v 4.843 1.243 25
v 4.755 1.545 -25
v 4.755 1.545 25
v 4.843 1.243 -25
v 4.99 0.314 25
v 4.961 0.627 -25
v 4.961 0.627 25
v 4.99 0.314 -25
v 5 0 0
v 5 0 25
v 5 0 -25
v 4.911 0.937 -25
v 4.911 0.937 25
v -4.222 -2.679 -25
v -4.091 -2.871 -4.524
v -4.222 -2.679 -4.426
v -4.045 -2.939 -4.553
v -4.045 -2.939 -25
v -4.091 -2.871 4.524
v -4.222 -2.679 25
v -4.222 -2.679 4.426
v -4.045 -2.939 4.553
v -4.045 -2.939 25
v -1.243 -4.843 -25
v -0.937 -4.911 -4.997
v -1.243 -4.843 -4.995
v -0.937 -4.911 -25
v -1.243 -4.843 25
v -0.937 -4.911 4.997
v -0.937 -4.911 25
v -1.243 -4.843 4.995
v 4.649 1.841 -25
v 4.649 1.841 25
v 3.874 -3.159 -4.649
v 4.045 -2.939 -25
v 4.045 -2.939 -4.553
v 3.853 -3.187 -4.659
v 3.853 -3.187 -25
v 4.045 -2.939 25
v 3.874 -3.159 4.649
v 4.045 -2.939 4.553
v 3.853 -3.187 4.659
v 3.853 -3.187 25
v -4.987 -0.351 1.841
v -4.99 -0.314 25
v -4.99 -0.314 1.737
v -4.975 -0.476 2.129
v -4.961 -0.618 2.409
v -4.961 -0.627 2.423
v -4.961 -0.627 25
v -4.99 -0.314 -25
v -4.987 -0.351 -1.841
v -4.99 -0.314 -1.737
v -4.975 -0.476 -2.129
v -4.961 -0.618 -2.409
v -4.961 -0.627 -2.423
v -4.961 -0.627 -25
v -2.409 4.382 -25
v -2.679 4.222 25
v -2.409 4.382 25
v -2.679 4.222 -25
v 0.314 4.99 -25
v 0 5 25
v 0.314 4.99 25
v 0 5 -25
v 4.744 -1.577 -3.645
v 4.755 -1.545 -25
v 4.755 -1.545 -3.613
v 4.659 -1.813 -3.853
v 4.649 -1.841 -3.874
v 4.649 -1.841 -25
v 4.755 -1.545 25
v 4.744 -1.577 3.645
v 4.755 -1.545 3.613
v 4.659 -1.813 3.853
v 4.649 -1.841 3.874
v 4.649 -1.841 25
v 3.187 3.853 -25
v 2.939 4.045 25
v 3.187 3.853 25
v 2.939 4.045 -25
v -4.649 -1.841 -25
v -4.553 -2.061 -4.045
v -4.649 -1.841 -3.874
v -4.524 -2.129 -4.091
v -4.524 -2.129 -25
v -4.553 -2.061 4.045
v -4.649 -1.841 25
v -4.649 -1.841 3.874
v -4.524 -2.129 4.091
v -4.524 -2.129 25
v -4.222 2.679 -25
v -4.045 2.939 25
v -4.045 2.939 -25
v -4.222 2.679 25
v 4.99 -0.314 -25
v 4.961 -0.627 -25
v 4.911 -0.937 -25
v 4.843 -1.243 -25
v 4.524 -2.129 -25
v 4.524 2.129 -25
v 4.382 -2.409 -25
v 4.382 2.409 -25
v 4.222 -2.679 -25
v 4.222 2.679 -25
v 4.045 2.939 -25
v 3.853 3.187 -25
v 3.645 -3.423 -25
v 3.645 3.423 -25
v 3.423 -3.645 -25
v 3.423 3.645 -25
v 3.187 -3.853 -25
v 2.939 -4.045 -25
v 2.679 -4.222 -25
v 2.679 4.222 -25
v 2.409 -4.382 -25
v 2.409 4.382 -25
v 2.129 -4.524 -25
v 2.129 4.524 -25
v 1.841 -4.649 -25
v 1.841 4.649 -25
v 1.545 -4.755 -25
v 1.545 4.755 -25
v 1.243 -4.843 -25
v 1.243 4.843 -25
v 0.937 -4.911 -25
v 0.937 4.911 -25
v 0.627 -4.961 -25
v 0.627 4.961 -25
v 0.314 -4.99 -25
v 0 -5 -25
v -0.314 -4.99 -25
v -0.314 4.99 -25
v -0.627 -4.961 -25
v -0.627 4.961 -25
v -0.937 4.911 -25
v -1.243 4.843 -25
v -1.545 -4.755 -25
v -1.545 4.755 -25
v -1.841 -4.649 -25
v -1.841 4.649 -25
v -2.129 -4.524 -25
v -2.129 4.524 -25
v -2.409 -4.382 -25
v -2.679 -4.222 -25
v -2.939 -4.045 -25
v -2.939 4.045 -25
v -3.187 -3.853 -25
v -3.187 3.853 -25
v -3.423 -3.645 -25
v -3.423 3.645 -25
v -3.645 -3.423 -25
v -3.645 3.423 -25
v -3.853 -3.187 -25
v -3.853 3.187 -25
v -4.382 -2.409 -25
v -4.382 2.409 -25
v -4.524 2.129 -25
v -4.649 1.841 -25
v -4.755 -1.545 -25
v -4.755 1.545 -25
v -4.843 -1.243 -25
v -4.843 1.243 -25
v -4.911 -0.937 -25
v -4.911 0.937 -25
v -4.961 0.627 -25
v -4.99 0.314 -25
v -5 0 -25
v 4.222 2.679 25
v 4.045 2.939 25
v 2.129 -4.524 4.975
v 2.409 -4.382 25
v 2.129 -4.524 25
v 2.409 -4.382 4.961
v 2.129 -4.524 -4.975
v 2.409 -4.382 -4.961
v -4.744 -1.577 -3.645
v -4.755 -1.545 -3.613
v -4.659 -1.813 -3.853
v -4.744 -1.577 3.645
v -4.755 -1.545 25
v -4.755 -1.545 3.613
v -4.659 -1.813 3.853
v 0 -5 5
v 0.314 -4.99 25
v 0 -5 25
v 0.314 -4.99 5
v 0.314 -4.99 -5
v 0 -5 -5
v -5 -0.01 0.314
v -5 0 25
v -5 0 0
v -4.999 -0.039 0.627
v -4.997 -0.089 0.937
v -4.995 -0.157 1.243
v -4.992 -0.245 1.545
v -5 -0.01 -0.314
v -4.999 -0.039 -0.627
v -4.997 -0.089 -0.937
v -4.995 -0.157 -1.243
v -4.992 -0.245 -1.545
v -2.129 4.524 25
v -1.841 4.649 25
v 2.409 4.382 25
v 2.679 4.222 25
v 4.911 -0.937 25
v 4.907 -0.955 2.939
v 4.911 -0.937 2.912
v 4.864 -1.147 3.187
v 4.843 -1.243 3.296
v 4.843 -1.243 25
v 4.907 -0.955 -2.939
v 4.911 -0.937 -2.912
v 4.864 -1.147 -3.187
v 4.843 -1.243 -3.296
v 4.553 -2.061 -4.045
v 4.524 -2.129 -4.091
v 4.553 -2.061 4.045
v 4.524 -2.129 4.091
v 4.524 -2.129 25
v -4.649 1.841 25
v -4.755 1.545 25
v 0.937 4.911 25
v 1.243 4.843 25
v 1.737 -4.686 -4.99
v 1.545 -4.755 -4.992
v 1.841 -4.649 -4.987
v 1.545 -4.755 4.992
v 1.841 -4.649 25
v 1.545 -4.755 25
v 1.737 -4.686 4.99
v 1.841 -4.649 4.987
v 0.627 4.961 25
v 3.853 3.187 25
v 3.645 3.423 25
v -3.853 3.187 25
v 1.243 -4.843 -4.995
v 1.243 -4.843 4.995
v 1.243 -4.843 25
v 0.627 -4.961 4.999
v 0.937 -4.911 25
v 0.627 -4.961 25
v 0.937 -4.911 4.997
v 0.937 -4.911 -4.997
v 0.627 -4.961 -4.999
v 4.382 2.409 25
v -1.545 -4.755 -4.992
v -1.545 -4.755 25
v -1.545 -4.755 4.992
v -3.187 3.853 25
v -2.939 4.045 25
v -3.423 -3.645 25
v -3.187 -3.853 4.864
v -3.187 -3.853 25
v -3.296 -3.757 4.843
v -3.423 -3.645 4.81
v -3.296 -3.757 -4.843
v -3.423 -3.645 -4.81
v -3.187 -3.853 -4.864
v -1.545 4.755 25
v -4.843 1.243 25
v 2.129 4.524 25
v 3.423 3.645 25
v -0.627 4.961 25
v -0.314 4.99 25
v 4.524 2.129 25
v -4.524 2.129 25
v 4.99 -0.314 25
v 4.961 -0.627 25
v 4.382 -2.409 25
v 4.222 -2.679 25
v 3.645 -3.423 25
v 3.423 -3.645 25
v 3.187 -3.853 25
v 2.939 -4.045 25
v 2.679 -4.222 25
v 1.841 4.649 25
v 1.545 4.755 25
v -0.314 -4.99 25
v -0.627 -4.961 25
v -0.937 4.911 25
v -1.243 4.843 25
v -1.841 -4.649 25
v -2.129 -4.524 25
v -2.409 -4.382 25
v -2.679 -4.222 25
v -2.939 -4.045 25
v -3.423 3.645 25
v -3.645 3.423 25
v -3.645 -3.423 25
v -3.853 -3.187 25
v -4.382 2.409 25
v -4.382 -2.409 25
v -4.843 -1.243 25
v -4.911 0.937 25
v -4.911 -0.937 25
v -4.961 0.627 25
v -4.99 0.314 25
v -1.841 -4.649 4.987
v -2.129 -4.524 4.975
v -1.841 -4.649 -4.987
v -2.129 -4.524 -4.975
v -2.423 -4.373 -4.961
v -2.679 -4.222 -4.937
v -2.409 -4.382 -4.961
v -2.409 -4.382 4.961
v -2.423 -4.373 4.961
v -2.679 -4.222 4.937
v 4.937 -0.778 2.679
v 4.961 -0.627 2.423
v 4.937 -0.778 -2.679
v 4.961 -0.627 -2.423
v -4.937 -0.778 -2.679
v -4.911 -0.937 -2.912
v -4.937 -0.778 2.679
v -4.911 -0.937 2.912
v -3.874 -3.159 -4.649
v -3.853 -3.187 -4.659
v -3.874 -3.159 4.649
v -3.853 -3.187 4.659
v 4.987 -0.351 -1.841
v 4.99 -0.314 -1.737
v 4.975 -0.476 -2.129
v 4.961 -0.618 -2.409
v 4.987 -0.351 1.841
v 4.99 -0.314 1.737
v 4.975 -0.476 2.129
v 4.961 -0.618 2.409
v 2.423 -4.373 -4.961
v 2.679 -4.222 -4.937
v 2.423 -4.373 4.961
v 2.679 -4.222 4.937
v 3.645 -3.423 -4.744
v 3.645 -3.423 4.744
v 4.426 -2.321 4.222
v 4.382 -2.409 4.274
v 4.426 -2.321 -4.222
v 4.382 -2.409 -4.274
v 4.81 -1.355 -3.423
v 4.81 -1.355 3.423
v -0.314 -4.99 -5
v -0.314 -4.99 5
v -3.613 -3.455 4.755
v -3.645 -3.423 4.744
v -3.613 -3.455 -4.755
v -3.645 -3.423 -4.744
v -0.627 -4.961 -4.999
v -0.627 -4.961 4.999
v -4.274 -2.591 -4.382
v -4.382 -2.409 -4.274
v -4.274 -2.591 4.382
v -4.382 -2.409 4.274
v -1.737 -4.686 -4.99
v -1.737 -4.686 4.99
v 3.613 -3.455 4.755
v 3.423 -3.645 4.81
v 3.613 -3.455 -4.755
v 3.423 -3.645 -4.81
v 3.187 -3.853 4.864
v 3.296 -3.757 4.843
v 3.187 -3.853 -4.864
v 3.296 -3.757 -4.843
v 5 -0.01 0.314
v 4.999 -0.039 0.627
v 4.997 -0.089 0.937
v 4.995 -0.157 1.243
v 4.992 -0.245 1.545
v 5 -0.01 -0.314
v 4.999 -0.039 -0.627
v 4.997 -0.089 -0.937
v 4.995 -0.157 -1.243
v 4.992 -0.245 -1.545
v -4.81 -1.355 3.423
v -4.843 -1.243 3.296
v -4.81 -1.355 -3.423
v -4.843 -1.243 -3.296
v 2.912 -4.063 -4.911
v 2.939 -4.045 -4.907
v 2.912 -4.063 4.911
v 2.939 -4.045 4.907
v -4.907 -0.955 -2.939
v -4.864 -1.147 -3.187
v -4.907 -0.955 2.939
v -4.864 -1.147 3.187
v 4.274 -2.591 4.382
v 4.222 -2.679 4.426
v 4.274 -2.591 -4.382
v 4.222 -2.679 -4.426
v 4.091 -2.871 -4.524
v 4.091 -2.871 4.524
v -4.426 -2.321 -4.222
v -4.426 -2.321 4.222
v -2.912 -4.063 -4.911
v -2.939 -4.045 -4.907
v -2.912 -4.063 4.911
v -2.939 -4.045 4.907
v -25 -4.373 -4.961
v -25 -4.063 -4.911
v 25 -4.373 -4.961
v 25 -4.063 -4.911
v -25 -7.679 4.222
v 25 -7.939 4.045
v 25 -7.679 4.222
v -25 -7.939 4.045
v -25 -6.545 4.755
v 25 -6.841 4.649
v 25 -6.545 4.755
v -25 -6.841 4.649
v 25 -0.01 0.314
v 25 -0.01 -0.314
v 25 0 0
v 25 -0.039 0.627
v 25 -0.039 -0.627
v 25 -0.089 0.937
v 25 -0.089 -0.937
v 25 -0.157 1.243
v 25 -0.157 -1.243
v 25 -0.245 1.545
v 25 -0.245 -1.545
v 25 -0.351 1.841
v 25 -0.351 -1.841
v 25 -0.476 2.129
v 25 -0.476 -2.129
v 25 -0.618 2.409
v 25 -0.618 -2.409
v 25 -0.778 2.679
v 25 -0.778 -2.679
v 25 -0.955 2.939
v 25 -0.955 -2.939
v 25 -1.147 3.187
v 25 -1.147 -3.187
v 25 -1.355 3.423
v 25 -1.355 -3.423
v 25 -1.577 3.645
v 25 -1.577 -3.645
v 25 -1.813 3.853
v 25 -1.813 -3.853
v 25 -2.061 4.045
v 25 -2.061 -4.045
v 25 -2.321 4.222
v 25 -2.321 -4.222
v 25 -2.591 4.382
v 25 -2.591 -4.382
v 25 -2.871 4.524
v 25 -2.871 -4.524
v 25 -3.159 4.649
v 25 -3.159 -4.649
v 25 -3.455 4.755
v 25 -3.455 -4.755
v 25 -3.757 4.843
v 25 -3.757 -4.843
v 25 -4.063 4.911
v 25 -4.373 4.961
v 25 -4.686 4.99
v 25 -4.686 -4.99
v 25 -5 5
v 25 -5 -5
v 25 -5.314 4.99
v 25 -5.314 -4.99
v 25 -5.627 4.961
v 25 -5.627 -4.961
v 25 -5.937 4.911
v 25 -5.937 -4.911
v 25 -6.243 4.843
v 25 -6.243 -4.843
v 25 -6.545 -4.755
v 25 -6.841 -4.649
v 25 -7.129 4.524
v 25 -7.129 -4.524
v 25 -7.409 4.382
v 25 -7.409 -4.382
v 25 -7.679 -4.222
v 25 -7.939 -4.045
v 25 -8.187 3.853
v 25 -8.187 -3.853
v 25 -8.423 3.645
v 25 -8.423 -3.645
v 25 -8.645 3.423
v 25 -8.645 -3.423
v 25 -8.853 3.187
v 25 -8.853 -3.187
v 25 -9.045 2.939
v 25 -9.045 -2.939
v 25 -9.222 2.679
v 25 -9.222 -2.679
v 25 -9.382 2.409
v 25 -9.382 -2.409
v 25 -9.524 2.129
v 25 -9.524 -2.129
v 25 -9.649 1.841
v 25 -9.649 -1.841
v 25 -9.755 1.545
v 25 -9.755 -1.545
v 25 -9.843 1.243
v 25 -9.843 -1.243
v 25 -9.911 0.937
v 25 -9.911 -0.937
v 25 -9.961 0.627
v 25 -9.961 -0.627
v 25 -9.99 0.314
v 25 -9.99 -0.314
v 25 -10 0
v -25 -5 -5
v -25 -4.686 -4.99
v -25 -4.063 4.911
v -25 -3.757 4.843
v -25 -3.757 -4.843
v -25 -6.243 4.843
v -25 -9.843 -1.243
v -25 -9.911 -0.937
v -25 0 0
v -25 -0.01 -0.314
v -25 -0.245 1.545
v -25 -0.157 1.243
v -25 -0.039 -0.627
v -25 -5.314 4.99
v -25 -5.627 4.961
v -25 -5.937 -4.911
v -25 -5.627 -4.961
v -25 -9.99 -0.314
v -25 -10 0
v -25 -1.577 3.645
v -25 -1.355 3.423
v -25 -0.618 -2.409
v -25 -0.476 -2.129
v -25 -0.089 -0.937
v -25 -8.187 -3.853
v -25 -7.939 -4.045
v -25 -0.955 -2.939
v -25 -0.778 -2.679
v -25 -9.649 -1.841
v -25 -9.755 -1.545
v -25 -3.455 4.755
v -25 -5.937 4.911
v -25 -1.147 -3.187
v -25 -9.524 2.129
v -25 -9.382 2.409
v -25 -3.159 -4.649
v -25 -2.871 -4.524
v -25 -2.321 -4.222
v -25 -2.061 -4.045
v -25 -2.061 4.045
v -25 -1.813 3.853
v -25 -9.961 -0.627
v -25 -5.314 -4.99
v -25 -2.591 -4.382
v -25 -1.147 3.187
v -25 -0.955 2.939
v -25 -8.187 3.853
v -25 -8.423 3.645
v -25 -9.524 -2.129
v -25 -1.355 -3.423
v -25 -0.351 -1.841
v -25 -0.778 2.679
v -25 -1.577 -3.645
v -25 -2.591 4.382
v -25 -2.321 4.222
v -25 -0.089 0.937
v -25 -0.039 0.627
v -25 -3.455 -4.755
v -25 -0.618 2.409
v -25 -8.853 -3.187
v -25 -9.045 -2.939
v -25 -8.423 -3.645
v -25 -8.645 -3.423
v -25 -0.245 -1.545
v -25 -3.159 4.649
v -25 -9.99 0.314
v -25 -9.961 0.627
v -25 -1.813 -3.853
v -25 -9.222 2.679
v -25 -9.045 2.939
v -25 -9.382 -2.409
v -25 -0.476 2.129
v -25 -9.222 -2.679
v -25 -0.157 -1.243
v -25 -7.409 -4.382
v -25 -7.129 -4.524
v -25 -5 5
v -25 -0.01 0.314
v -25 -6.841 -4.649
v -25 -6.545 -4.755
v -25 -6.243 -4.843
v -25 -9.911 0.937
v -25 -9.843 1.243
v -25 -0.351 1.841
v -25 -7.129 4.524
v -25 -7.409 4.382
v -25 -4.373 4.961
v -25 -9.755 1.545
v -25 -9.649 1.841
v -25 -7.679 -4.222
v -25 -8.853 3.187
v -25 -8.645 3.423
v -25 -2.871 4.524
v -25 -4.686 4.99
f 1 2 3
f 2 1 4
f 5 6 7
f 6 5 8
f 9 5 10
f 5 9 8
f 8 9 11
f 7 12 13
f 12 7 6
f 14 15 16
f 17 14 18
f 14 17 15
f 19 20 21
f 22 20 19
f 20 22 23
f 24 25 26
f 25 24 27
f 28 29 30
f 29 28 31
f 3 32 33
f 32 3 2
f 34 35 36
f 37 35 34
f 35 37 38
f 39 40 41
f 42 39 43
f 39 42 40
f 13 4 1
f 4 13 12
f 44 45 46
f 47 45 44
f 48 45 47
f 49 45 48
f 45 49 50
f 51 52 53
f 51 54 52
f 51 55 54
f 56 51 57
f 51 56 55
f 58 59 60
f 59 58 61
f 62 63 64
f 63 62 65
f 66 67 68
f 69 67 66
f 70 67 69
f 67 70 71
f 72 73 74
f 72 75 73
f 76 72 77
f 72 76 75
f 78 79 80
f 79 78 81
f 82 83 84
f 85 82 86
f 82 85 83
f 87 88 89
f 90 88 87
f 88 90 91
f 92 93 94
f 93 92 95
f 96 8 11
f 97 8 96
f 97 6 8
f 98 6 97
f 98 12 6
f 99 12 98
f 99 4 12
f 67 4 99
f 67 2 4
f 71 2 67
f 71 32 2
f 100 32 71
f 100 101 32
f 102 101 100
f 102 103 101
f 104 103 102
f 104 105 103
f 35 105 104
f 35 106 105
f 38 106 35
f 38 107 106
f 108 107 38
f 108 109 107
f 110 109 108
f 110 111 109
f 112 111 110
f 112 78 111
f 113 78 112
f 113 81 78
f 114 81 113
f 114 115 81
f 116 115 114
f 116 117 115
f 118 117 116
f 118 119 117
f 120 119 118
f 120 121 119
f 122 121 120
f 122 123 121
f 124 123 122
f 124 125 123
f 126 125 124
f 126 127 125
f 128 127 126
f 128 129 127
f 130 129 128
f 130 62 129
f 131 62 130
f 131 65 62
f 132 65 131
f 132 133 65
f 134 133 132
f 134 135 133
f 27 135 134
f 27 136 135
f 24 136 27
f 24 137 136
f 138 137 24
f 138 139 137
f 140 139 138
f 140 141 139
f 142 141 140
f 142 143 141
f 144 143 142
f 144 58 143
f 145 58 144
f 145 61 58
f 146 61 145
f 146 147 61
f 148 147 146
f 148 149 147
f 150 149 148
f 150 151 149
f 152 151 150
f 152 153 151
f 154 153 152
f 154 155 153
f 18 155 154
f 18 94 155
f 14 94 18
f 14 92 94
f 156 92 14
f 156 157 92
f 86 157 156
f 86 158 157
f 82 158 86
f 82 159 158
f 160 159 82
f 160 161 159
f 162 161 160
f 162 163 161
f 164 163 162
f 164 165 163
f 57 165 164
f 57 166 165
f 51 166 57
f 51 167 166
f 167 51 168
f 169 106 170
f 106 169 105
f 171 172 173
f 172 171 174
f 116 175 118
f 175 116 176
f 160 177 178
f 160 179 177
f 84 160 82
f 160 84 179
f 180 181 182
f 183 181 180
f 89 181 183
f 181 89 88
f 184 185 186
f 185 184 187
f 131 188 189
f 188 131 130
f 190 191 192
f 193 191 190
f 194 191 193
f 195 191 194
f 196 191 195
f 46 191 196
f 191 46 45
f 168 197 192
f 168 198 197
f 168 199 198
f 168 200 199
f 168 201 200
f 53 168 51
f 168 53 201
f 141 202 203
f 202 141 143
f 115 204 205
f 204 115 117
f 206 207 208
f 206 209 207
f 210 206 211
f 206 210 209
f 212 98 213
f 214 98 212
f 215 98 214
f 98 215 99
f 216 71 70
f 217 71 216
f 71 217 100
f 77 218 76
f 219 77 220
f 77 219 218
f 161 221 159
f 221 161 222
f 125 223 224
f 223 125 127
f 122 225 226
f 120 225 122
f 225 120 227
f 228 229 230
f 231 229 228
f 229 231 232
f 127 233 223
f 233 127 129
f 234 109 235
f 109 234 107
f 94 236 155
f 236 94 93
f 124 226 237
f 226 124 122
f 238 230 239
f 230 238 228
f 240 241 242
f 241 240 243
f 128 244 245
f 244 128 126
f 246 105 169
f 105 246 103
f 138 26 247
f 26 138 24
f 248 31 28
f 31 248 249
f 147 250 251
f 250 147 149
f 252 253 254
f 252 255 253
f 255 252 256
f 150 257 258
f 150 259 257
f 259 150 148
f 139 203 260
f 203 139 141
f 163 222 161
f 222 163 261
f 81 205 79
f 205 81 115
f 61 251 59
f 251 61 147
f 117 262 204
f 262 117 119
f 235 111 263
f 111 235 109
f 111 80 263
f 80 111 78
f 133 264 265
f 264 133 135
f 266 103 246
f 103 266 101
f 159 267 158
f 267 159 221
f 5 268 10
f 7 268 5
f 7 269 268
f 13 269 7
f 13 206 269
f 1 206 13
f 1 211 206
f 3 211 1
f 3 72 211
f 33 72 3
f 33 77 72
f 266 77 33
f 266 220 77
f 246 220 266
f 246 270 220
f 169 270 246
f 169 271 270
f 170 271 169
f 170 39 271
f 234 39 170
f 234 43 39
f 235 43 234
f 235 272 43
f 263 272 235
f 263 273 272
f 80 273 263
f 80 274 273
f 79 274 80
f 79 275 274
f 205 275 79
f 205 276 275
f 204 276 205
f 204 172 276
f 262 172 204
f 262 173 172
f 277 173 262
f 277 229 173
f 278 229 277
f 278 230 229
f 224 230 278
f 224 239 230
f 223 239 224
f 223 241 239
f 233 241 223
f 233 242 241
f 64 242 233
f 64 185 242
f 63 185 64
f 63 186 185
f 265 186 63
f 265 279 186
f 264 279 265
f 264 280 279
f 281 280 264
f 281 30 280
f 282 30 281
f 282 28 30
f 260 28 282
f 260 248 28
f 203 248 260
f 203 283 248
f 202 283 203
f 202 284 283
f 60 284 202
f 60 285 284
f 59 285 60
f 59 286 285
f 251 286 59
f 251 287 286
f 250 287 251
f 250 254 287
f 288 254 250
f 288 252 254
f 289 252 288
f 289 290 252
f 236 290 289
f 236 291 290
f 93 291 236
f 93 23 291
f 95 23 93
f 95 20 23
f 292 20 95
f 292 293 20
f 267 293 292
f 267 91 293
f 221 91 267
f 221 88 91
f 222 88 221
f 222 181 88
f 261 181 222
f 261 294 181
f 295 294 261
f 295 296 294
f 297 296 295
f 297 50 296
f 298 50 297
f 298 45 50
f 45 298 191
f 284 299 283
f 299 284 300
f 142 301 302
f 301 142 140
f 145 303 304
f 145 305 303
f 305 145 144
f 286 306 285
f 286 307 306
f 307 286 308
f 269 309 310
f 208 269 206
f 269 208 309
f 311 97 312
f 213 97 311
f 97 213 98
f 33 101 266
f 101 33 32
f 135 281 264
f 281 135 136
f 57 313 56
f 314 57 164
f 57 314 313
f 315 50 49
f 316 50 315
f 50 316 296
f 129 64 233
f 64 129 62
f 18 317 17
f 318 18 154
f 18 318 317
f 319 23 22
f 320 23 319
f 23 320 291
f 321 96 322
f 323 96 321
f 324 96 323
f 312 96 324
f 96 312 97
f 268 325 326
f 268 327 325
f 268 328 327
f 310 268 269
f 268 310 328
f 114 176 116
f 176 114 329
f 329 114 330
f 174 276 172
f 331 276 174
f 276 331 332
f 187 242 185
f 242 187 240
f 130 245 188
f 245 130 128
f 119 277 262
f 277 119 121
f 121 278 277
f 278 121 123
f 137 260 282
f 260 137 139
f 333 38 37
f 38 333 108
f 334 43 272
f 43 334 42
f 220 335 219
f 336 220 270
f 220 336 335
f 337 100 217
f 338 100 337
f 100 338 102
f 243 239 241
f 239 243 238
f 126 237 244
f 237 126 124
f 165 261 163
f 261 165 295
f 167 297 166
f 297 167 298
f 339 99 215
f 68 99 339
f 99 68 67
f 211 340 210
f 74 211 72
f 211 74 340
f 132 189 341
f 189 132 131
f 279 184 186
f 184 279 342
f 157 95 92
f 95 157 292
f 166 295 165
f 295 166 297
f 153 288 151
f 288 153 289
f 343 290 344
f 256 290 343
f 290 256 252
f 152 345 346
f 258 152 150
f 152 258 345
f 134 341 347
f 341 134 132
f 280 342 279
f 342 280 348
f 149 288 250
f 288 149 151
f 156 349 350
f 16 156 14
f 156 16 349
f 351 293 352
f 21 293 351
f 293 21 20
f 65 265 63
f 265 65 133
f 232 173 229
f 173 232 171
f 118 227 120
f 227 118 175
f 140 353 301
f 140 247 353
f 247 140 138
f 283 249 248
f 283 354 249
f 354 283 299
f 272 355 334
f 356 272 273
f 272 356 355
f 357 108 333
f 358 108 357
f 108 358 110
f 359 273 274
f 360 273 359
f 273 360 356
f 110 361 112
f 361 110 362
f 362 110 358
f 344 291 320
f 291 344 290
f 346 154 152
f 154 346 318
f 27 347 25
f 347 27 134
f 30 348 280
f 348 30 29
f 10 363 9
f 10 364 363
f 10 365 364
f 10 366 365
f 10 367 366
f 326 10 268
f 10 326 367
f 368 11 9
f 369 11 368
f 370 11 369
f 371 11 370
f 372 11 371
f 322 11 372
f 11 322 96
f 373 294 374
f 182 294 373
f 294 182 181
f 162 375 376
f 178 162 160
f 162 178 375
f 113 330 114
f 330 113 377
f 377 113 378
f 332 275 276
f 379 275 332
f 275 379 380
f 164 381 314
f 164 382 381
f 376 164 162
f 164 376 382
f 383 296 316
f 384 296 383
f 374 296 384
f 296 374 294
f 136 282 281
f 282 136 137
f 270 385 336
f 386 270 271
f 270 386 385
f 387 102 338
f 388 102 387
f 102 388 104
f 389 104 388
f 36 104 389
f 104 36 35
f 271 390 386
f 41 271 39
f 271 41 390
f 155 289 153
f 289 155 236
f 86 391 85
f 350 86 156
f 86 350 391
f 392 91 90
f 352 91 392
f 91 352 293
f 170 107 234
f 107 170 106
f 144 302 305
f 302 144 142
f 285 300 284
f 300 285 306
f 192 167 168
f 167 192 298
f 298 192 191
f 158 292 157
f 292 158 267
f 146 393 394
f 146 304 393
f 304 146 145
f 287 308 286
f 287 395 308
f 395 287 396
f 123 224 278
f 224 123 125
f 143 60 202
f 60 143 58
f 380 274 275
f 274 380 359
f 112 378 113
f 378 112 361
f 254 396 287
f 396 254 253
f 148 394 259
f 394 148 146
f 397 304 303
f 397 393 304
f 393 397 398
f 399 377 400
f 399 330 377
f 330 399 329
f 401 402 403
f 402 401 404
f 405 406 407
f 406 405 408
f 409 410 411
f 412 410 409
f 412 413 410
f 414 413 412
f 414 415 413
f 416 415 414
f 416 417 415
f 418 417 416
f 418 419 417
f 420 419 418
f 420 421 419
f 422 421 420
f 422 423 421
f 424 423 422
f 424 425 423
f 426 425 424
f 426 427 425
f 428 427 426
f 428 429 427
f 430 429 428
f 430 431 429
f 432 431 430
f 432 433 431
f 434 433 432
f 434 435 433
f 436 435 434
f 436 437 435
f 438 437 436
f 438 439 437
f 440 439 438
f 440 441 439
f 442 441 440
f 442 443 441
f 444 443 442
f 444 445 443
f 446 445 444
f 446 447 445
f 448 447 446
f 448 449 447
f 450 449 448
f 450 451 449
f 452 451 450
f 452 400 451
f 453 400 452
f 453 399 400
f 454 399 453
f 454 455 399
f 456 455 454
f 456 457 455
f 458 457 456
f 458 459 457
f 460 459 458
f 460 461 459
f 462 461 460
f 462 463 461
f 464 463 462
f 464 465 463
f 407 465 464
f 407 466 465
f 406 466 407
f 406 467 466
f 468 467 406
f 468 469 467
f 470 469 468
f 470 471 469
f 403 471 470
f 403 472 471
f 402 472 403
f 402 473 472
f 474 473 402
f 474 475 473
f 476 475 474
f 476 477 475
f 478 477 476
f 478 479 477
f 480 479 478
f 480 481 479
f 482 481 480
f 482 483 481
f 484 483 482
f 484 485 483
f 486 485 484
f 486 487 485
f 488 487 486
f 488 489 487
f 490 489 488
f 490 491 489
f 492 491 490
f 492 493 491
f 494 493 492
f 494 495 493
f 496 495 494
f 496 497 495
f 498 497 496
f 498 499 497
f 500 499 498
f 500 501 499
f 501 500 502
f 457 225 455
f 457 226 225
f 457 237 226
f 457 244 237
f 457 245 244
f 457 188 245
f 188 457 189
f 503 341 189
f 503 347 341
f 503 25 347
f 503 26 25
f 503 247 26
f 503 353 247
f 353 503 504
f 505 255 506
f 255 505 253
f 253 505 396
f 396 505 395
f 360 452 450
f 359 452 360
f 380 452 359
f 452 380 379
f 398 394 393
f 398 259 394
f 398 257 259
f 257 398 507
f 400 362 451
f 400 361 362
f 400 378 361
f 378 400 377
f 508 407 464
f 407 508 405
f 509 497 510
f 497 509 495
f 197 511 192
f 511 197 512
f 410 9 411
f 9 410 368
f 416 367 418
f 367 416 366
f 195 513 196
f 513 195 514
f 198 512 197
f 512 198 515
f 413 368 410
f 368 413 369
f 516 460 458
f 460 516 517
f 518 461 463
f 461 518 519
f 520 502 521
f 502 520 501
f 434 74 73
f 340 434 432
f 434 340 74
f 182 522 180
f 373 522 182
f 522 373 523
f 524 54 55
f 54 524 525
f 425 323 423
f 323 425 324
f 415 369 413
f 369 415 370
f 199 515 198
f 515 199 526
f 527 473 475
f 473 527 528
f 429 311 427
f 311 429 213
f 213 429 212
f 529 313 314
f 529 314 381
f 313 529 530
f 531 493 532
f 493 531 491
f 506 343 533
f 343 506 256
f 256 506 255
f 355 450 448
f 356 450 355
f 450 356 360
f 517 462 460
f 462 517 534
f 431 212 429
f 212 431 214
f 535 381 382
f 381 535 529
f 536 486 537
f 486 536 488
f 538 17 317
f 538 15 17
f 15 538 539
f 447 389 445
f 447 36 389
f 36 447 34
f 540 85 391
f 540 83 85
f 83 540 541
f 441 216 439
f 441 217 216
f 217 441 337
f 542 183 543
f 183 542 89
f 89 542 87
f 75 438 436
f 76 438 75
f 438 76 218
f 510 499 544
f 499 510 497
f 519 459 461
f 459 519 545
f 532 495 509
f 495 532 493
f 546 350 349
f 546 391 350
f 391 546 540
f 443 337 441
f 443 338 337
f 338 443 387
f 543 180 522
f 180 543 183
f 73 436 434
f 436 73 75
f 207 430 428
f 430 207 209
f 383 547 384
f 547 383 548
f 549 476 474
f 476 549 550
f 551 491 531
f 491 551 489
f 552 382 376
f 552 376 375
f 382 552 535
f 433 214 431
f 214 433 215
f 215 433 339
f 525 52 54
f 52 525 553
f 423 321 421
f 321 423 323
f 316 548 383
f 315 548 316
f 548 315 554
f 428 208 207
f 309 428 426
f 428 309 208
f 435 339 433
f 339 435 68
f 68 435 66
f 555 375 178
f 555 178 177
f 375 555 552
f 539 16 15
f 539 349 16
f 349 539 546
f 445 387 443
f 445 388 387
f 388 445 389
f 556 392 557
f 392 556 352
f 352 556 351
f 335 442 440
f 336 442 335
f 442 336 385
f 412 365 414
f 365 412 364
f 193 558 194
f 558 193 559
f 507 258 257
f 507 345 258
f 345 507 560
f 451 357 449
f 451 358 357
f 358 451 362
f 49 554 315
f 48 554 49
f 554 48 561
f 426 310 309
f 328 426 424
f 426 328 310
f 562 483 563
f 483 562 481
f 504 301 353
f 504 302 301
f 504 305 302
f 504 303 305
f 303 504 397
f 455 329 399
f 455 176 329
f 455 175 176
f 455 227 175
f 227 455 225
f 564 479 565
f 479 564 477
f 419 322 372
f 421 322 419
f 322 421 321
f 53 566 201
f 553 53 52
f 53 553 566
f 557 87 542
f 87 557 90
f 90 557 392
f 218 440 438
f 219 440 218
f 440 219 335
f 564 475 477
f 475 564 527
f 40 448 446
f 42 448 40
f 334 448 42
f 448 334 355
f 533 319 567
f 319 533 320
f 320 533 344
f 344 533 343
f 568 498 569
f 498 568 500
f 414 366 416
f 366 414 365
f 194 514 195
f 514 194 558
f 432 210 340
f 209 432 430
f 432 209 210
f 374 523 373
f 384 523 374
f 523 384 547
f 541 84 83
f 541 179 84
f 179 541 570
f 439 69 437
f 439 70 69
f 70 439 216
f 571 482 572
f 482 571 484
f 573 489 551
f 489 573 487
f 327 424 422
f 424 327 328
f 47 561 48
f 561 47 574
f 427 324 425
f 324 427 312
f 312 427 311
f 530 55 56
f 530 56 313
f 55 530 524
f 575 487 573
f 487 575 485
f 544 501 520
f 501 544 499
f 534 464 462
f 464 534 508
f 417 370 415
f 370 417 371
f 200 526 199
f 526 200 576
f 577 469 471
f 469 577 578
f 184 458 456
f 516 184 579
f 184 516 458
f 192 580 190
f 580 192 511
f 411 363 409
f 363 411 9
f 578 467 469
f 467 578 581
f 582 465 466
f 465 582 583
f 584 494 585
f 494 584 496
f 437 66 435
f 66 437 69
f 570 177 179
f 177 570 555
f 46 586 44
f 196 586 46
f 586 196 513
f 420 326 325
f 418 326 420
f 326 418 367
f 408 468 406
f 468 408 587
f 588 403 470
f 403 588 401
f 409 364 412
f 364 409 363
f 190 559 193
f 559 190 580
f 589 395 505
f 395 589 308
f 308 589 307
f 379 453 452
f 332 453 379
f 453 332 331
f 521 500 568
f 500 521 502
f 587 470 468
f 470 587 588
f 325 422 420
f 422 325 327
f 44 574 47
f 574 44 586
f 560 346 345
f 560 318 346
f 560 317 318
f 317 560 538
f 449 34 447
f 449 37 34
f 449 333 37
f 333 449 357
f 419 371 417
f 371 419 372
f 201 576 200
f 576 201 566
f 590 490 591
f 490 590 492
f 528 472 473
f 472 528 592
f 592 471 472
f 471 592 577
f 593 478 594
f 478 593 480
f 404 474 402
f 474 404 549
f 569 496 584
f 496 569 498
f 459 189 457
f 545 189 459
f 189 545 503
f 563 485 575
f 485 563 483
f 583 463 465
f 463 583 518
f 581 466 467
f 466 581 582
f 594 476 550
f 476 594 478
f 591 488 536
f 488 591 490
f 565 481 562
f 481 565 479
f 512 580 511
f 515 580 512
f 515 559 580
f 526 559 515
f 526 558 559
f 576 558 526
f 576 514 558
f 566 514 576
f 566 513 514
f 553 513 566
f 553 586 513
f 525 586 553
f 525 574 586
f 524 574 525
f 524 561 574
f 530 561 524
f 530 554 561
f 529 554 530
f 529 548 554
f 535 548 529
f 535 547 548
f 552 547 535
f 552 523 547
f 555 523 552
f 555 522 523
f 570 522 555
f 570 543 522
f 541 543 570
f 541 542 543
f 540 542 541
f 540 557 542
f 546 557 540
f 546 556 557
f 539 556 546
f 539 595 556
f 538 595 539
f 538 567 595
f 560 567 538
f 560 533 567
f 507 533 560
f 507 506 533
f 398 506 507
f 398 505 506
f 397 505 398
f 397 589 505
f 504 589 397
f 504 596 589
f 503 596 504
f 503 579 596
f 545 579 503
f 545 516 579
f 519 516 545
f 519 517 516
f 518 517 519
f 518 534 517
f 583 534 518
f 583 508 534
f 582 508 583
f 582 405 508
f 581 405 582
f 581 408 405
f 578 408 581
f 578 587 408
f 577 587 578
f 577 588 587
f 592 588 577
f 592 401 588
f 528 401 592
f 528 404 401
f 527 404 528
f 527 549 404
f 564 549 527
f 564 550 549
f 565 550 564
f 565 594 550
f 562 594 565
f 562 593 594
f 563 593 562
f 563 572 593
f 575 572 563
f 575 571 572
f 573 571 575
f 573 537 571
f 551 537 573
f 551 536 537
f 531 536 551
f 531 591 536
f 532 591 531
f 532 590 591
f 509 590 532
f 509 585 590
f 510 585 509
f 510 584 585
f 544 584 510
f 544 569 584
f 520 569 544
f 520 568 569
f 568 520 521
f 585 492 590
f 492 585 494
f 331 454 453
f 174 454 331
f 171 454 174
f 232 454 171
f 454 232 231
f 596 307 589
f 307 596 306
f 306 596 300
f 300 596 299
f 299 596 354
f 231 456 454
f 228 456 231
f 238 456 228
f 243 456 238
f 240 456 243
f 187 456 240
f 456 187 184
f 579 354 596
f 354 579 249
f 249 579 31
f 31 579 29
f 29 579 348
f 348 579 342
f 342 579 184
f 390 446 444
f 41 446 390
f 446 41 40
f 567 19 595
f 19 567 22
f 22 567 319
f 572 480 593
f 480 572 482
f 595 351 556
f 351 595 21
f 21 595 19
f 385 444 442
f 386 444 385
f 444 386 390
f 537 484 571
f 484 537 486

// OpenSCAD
/* 
	Supplemental T-Junction 2

*/

$fn = 100;  // Increase the resolution of the cylinders
pipe_radius = 5;
pipe_length = 50;

// Pipe along the x-axis
translate([0, 0, 0])
cylinder(h=pipe_length, r=pipe_radius, center=true);

// Pipe along the y-axis
rotate([0, 90, 0])
translate([0, -pipe_radius, 0])
cylinder(h=pipe_length, r=pipe_radius, center=true);
